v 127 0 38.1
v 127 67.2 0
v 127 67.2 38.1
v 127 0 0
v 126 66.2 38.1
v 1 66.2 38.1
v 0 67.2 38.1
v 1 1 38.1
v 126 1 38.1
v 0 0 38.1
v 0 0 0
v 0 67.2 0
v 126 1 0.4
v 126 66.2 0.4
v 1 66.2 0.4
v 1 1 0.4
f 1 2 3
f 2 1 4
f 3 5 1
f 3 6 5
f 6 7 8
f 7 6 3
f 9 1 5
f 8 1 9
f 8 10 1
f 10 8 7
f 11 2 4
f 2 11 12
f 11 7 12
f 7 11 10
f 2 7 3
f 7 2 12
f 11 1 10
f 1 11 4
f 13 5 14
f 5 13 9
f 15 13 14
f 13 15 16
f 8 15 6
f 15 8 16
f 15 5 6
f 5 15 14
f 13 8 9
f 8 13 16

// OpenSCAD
// file: ../bin.scad
module bin(width, depth, height, wall_thickness, floor_thickness) {
    difference() {
        cube([width, depth, height]);
        translate([
            wall_thickness, wall_thickness, floor_thickness
        ]) cube([
            width - 2 * wall_thickness,
            depth - 2 * wall_thickness,
            height - floor_thickness
        ]);
    }
}
// main file
use <../bin.scad>

// 1 inch = 25.4 mm

brush_bin_depth = 245;
razor_bin_depth = 7 * 25.4;
razor_bin_width = 5 * 25.4;

bin(
    razor_bin_width,
    brush_bin_depth - razor_bin_depth,
    1.5 * 25.4,
    1,
    0.4
);
